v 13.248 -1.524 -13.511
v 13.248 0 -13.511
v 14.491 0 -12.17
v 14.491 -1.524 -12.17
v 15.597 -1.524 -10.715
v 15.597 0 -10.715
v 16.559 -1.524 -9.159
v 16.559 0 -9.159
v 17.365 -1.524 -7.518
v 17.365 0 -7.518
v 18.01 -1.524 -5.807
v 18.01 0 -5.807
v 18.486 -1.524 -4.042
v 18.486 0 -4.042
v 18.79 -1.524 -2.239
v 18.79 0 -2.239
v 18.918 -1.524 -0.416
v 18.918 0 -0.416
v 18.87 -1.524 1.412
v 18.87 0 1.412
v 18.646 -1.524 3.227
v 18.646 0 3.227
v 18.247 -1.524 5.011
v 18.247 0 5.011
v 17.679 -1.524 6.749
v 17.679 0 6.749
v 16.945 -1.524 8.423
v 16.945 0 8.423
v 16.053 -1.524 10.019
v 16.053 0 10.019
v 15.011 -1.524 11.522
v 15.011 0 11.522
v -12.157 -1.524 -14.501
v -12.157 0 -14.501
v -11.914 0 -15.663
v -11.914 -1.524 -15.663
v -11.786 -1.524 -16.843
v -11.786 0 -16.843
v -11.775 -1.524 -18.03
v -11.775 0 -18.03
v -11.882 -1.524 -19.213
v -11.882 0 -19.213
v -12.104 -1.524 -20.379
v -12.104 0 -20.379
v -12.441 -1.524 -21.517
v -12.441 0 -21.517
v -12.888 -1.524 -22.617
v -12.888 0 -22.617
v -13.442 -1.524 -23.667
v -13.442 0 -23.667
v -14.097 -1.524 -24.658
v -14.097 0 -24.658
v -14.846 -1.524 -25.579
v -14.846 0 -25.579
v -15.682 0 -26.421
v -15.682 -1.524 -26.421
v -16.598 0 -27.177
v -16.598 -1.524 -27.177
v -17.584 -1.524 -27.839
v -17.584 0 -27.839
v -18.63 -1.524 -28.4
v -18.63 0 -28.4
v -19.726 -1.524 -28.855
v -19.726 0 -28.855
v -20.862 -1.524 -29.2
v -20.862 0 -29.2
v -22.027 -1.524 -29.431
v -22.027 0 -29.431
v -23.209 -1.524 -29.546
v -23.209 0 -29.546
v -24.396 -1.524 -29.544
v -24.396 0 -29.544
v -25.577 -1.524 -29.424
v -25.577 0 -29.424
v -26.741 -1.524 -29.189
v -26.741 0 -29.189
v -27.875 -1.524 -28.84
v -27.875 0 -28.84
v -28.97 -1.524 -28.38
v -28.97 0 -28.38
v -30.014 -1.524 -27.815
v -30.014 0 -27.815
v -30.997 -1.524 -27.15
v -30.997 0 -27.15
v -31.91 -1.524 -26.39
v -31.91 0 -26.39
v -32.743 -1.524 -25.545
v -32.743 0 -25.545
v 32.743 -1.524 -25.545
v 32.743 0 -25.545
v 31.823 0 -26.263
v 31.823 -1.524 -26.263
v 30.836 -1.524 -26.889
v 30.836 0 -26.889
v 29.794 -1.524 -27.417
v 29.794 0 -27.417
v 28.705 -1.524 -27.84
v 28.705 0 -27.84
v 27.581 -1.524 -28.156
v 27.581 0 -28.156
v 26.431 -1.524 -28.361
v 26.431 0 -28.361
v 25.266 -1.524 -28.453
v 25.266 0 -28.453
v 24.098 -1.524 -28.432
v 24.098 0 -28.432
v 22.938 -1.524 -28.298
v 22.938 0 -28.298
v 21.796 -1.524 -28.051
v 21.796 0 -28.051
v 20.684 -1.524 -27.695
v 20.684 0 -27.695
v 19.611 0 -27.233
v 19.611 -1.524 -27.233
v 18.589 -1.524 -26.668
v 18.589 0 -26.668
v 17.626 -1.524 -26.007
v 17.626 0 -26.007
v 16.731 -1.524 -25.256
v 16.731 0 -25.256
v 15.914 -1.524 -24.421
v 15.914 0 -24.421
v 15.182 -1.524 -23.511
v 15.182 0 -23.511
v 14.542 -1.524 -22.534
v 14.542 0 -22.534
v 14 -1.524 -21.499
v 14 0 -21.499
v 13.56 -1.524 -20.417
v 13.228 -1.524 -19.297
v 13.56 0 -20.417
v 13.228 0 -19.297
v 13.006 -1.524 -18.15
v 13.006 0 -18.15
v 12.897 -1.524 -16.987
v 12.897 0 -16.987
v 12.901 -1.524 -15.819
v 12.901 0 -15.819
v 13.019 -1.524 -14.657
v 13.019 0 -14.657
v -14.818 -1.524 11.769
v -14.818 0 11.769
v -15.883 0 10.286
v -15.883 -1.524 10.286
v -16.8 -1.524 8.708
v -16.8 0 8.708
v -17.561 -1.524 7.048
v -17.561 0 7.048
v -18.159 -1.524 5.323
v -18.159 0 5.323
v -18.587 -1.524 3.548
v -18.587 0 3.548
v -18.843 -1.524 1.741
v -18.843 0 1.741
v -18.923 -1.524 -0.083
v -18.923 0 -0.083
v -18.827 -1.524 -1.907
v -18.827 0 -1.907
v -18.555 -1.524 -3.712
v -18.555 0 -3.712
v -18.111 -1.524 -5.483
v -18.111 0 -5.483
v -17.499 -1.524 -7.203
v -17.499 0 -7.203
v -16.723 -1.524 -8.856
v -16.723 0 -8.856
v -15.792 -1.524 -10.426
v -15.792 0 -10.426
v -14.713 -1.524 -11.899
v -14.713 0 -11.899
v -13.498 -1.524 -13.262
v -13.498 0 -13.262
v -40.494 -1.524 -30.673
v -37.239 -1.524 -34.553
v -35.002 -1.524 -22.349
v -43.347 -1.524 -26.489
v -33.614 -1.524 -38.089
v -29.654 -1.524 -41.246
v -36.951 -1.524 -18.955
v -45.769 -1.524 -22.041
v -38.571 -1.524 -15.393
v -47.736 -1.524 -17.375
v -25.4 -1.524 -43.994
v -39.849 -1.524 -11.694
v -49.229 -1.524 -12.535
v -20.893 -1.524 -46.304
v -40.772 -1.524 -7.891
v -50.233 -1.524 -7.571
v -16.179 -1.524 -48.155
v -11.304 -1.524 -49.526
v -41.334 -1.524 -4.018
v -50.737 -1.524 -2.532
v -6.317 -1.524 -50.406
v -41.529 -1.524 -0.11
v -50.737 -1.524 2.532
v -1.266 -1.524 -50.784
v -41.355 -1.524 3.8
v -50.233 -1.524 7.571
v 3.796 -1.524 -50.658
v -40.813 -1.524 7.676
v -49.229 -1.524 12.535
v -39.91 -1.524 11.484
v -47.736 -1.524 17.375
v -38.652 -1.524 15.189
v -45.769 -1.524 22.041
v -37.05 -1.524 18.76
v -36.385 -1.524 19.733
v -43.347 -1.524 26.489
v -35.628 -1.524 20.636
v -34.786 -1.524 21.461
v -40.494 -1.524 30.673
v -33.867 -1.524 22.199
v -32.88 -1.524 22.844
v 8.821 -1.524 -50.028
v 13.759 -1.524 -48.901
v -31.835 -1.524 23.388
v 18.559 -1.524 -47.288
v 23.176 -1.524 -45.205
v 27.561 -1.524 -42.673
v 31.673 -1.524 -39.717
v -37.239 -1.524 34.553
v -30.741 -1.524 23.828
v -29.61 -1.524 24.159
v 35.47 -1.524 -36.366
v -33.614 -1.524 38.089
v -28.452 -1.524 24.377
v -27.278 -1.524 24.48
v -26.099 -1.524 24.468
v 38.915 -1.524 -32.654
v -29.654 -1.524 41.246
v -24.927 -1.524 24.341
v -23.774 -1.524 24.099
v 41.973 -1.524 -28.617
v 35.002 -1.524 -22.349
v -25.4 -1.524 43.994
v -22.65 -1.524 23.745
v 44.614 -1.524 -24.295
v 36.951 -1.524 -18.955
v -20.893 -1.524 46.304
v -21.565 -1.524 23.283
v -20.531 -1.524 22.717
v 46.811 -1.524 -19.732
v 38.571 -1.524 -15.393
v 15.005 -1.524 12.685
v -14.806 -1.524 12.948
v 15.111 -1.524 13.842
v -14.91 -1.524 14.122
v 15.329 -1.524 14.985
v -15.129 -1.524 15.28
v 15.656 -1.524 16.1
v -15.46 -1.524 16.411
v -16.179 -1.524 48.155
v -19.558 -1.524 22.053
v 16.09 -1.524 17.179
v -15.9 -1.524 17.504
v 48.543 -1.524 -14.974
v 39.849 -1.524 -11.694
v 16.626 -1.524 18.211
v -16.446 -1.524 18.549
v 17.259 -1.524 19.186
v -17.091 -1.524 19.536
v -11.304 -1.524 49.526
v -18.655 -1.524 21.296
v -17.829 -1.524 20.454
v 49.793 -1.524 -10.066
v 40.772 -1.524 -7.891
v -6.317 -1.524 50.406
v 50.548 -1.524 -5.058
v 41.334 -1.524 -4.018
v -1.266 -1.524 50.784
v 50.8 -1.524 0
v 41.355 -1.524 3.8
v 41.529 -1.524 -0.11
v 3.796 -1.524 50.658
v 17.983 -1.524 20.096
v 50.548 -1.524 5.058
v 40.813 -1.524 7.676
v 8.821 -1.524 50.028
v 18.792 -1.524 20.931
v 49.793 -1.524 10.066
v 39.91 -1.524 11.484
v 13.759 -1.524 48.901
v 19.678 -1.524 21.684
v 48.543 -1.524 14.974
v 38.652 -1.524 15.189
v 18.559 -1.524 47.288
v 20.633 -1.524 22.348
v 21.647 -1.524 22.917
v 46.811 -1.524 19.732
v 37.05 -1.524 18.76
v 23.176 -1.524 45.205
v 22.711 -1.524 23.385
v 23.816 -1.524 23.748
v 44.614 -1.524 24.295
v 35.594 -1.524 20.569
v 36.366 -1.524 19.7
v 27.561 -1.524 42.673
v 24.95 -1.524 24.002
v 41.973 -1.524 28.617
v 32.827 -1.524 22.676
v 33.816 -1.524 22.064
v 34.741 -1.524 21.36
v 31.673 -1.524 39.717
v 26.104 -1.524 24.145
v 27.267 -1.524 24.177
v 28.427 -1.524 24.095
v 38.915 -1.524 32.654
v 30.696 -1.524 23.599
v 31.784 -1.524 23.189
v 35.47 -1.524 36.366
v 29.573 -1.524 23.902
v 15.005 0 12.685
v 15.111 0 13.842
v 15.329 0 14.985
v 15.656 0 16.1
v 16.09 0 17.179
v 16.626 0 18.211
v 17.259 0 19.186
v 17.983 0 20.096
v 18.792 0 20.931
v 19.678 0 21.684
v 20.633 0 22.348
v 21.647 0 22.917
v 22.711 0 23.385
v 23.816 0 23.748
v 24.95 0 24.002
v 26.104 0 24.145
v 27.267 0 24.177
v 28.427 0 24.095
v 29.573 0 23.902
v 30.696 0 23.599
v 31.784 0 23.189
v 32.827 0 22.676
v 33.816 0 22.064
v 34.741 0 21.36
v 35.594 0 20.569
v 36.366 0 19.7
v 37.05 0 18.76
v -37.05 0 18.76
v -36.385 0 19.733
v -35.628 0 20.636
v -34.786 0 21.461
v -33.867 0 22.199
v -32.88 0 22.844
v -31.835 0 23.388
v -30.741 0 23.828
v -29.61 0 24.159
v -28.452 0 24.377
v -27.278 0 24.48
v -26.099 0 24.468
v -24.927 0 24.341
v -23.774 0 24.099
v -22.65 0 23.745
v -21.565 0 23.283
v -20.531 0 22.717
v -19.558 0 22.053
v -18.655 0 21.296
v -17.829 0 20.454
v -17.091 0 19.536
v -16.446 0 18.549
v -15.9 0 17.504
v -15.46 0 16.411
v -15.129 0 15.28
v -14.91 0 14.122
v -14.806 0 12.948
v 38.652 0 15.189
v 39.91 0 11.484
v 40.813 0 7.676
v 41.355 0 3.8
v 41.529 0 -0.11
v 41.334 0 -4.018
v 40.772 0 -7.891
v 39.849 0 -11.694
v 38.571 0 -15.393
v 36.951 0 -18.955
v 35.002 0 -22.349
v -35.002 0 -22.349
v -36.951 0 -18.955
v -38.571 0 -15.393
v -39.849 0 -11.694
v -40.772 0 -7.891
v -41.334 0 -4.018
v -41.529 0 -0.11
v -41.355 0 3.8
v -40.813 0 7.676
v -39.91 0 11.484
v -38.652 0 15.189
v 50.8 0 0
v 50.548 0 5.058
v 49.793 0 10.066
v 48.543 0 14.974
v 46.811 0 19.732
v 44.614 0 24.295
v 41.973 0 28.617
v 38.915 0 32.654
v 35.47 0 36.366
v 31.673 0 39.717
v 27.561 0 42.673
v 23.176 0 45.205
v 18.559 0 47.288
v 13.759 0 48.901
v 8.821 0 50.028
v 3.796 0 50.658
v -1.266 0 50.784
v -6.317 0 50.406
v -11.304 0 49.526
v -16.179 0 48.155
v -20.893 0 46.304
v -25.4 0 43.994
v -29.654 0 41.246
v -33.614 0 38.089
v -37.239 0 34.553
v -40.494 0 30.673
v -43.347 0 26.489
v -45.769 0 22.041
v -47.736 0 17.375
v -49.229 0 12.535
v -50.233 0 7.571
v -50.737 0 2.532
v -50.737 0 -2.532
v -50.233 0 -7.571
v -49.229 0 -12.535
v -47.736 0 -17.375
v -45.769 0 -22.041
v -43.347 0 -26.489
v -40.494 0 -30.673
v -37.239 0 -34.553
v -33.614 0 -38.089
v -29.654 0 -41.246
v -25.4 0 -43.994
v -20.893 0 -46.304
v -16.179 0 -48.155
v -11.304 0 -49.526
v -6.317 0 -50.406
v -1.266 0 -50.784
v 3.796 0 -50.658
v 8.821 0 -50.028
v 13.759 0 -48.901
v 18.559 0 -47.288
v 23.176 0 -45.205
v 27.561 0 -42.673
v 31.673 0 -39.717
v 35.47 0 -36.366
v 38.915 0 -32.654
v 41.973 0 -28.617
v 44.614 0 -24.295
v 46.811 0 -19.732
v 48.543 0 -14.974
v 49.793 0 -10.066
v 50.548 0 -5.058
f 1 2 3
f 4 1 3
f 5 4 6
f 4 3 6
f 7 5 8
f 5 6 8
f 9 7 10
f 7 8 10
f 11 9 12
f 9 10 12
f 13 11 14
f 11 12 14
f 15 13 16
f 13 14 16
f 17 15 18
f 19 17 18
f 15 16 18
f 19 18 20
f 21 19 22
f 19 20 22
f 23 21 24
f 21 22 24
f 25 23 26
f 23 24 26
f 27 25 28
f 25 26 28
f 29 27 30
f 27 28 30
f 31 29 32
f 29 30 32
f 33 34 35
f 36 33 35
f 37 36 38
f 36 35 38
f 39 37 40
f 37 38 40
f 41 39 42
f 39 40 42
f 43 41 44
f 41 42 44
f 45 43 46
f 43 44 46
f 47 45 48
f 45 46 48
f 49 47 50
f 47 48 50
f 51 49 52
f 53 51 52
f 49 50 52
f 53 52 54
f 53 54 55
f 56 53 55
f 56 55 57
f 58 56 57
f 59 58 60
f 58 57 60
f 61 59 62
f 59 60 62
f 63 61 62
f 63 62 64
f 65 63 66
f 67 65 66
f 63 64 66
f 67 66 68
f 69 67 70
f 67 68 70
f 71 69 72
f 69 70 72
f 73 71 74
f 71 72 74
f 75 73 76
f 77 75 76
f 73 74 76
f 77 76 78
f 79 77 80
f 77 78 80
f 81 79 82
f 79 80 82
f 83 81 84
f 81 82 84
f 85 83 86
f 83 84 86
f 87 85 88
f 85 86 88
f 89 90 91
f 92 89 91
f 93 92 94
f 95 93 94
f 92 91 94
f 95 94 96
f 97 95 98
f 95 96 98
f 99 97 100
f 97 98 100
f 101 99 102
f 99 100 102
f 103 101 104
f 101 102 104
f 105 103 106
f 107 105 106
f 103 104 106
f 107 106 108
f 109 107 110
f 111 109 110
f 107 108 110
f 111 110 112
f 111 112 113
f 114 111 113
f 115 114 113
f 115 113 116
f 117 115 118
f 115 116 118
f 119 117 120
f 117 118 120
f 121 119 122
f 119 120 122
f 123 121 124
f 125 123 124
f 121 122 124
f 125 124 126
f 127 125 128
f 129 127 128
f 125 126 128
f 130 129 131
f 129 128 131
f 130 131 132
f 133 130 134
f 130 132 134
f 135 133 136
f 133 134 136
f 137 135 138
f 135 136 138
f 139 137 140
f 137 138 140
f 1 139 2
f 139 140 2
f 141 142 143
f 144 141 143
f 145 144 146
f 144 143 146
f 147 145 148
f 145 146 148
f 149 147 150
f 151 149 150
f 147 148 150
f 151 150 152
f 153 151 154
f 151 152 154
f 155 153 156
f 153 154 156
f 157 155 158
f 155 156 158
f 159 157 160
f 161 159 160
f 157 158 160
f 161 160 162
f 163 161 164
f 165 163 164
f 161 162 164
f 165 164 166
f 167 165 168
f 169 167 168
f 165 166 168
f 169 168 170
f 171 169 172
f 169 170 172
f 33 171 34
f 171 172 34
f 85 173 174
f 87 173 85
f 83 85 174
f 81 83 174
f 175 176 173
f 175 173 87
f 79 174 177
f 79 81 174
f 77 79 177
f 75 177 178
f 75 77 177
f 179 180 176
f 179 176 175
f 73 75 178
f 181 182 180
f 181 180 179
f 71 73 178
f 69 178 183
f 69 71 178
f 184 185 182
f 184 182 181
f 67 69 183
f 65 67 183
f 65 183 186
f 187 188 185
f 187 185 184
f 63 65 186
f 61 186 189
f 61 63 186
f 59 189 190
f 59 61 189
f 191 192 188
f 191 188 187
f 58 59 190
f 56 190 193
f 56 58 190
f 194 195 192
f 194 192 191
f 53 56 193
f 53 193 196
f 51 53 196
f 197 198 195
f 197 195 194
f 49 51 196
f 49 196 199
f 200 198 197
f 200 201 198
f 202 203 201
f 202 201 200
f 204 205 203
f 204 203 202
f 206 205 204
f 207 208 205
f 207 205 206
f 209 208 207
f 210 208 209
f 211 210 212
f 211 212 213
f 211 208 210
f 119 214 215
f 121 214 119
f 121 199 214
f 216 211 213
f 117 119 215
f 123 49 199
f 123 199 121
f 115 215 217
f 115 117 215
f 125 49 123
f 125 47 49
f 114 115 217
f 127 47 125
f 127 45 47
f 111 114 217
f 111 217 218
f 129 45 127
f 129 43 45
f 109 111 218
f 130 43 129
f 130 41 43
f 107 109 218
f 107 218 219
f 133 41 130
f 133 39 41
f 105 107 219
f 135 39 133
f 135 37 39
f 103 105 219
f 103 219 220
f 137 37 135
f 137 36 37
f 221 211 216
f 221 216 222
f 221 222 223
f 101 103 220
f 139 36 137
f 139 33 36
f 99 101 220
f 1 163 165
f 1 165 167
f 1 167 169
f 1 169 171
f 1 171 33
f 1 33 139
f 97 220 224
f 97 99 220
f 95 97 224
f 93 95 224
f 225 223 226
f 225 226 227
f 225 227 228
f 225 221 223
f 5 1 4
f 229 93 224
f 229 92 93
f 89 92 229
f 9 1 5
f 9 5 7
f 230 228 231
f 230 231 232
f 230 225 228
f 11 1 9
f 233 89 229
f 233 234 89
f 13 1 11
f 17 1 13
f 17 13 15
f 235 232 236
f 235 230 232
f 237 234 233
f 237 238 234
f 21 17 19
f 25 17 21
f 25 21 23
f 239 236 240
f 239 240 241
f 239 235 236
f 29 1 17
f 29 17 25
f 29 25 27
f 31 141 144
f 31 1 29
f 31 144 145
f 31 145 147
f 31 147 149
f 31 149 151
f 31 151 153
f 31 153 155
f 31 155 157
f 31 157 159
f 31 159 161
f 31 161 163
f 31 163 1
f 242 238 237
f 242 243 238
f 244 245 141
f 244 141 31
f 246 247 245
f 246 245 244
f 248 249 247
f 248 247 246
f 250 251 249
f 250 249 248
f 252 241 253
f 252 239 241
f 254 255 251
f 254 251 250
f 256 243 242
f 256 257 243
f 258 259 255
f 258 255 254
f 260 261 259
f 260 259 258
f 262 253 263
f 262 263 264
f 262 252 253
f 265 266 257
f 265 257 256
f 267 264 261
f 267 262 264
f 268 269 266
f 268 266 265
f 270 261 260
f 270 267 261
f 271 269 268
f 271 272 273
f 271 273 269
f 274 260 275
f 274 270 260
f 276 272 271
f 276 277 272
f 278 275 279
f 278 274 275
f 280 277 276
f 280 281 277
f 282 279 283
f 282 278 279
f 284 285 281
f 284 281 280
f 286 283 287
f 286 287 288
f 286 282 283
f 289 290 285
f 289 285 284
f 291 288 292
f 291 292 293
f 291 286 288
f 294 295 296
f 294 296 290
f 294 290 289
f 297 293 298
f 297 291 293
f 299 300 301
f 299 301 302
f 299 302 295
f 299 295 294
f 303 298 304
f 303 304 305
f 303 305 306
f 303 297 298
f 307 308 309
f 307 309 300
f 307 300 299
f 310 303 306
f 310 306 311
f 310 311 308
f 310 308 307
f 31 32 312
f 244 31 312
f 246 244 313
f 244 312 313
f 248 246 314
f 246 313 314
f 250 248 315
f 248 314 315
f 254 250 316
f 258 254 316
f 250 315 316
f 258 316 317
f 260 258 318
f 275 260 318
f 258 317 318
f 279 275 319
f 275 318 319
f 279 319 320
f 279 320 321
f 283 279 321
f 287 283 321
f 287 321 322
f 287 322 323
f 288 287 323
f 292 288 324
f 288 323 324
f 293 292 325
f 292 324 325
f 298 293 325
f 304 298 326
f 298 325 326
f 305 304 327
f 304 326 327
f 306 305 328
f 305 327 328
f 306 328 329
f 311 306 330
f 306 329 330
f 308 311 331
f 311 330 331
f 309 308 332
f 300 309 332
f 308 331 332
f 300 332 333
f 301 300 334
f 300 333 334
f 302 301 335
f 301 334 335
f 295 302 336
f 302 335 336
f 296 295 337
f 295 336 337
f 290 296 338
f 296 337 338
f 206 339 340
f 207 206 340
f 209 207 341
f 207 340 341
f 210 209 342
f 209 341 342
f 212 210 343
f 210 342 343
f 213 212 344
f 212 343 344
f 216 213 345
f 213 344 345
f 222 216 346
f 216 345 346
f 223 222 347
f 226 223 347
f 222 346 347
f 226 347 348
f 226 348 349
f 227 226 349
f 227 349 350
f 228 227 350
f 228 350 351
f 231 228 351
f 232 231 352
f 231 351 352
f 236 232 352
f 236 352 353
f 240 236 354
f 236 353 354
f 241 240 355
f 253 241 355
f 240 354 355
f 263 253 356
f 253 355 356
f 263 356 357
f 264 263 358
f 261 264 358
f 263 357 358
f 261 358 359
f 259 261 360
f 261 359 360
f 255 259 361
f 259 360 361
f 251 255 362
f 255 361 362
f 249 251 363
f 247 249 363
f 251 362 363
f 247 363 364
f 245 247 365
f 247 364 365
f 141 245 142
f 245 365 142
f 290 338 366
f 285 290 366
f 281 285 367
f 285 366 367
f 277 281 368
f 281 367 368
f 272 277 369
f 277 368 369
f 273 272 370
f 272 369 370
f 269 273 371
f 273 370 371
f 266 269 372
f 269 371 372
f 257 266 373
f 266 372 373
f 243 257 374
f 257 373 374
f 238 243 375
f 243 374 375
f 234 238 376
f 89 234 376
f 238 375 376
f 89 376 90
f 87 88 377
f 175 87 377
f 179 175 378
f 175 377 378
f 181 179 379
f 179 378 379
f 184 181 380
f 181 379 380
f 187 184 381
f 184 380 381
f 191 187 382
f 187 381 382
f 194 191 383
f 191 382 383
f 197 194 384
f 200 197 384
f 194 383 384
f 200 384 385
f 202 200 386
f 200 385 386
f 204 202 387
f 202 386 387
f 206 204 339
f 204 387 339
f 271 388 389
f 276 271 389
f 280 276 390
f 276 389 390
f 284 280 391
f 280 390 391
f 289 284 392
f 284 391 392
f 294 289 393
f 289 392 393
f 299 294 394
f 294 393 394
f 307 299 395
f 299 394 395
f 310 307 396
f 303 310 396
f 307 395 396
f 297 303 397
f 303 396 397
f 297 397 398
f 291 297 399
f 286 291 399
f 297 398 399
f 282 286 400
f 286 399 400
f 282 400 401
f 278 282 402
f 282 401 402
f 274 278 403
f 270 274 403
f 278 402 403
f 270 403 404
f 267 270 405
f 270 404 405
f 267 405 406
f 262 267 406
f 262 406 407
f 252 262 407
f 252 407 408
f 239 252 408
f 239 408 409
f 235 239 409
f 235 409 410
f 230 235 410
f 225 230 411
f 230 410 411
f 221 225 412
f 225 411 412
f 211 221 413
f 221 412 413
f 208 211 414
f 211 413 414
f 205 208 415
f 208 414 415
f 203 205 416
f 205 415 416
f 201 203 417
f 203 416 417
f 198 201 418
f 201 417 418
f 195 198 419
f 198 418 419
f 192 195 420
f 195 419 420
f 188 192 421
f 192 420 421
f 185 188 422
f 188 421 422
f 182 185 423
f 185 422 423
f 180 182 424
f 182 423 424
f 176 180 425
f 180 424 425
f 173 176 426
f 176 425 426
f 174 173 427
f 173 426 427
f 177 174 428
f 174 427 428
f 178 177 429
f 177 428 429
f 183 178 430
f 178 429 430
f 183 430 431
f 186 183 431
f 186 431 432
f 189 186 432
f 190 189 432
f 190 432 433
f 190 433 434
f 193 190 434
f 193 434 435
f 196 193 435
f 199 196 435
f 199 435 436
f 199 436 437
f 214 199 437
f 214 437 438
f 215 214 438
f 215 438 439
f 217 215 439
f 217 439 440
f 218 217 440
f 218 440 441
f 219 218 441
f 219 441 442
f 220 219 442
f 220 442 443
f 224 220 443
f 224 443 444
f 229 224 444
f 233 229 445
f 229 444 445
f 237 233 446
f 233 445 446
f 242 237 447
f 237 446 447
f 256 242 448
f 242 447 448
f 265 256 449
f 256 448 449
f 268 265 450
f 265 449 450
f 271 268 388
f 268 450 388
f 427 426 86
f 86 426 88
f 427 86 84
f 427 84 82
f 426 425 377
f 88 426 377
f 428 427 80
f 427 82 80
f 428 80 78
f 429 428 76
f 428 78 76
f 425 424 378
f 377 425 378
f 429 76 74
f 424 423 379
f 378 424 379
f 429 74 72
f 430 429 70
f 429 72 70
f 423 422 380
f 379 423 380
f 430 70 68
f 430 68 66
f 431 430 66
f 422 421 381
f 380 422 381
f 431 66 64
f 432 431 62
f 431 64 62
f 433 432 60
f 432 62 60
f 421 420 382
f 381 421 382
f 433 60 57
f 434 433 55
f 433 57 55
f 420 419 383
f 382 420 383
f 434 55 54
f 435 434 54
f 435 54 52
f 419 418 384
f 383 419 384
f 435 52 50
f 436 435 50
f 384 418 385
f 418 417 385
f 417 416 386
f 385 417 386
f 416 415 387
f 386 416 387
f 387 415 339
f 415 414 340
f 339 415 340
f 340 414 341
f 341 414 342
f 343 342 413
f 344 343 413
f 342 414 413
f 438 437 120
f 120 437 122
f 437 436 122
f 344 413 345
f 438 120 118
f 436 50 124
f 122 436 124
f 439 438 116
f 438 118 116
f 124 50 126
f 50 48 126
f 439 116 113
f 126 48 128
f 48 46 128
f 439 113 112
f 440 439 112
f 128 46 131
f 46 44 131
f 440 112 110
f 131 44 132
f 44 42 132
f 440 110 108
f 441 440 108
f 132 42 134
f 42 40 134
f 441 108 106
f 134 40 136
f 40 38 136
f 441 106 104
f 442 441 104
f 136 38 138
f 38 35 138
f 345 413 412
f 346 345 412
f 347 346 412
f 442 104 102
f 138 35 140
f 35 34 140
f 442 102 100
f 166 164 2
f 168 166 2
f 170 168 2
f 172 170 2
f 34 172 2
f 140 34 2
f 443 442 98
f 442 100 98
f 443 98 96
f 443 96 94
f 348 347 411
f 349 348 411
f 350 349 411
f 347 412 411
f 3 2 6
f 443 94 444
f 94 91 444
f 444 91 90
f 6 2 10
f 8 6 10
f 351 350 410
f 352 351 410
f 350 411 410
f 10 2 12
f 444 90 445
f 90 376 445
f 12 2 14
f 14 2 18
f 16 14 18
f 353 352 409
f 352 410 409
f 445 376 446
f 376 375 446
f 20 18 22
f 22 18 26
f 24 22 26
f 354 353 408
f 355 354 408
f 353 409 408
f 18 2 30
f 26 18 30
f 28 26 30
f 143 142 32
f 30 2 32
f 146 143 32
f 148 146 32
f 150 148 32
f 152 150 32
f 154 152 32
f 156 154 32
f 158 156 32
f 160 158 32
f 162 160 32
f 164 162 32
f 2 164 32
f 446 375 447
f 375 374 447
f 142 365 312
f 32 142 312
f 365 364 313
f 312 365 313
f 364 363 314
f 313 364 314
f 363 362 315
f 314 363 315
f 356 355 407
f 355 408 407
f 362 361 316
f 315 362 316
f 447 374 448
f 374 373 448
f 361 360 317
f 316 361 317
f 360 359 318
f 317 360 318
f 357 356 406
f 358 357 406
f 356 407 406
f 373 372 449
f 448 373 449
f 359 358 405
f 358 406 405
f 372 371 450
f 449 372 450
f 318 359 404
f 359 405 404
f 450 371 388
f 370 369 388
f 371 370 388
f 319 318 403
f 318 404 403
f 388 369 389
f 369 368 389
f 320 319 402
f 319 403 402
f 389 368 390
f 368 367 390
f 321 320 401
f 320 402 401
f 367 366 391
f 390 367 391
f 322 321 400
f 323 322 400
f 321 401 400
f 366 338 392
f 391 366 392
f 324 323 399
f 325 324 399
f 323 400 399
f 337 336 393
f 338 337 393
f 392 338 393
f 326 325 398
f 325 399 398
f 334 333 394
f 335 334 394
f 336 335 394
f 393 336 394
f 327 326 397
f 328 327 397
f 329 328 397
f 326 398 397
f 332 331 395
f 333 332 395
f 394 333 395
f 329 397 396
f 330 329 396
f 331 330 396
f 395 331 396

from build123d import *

# Parameters (mm, degrees)
F0_R     = 50.8
F1_DEPTH = 1.524


with BuildPart() as f1:
    # F0 (on Front) → F1 (new body)
    with BuildSketch(Plane.XZ):
        Circle(F0_R)
        with BuildLine():
            ThreePointArc((-32.743325, -25.544716), (-41.334156, -4.018132), (-37.050229, 18.76002))
            ThreePointArc((-37.050229, 18.76002), (-23.2074, 23.935861), (-14.817719, 11.769246))
            ThreePointArc((-14.817719, 11.769246), (-18.826709, -1.906553), (-12.157372, -14.500974))
            ThreePointArc((-12.157372, -14.500974), (-18.09988, -28.132282), (-32.743325, -25.544716))
        make_face(mode=Mode.SUBTRACT)
        with BuildLine():
            ThreePointArc((32.743325, -25.544716), (18.588573, -26.668251), (13.248466, -13.511406))
            ThreePointArc((13.248466, -13.511406), (18.876275, -1.328977), (15.01092, 11.521814))
            ThreePointArc((15.01092, 11.521814), (23.259145, 23.579527), (37.050229, 18.76002))
            ThreePointArc((37.050229, 18.76002), (41.334156, -4.018132), (32.743325, -25.544716))
        make_face(mode=Mode.SUBTRACT)
    extrude(amount=F1_DEPTH)


solid = f1.part
